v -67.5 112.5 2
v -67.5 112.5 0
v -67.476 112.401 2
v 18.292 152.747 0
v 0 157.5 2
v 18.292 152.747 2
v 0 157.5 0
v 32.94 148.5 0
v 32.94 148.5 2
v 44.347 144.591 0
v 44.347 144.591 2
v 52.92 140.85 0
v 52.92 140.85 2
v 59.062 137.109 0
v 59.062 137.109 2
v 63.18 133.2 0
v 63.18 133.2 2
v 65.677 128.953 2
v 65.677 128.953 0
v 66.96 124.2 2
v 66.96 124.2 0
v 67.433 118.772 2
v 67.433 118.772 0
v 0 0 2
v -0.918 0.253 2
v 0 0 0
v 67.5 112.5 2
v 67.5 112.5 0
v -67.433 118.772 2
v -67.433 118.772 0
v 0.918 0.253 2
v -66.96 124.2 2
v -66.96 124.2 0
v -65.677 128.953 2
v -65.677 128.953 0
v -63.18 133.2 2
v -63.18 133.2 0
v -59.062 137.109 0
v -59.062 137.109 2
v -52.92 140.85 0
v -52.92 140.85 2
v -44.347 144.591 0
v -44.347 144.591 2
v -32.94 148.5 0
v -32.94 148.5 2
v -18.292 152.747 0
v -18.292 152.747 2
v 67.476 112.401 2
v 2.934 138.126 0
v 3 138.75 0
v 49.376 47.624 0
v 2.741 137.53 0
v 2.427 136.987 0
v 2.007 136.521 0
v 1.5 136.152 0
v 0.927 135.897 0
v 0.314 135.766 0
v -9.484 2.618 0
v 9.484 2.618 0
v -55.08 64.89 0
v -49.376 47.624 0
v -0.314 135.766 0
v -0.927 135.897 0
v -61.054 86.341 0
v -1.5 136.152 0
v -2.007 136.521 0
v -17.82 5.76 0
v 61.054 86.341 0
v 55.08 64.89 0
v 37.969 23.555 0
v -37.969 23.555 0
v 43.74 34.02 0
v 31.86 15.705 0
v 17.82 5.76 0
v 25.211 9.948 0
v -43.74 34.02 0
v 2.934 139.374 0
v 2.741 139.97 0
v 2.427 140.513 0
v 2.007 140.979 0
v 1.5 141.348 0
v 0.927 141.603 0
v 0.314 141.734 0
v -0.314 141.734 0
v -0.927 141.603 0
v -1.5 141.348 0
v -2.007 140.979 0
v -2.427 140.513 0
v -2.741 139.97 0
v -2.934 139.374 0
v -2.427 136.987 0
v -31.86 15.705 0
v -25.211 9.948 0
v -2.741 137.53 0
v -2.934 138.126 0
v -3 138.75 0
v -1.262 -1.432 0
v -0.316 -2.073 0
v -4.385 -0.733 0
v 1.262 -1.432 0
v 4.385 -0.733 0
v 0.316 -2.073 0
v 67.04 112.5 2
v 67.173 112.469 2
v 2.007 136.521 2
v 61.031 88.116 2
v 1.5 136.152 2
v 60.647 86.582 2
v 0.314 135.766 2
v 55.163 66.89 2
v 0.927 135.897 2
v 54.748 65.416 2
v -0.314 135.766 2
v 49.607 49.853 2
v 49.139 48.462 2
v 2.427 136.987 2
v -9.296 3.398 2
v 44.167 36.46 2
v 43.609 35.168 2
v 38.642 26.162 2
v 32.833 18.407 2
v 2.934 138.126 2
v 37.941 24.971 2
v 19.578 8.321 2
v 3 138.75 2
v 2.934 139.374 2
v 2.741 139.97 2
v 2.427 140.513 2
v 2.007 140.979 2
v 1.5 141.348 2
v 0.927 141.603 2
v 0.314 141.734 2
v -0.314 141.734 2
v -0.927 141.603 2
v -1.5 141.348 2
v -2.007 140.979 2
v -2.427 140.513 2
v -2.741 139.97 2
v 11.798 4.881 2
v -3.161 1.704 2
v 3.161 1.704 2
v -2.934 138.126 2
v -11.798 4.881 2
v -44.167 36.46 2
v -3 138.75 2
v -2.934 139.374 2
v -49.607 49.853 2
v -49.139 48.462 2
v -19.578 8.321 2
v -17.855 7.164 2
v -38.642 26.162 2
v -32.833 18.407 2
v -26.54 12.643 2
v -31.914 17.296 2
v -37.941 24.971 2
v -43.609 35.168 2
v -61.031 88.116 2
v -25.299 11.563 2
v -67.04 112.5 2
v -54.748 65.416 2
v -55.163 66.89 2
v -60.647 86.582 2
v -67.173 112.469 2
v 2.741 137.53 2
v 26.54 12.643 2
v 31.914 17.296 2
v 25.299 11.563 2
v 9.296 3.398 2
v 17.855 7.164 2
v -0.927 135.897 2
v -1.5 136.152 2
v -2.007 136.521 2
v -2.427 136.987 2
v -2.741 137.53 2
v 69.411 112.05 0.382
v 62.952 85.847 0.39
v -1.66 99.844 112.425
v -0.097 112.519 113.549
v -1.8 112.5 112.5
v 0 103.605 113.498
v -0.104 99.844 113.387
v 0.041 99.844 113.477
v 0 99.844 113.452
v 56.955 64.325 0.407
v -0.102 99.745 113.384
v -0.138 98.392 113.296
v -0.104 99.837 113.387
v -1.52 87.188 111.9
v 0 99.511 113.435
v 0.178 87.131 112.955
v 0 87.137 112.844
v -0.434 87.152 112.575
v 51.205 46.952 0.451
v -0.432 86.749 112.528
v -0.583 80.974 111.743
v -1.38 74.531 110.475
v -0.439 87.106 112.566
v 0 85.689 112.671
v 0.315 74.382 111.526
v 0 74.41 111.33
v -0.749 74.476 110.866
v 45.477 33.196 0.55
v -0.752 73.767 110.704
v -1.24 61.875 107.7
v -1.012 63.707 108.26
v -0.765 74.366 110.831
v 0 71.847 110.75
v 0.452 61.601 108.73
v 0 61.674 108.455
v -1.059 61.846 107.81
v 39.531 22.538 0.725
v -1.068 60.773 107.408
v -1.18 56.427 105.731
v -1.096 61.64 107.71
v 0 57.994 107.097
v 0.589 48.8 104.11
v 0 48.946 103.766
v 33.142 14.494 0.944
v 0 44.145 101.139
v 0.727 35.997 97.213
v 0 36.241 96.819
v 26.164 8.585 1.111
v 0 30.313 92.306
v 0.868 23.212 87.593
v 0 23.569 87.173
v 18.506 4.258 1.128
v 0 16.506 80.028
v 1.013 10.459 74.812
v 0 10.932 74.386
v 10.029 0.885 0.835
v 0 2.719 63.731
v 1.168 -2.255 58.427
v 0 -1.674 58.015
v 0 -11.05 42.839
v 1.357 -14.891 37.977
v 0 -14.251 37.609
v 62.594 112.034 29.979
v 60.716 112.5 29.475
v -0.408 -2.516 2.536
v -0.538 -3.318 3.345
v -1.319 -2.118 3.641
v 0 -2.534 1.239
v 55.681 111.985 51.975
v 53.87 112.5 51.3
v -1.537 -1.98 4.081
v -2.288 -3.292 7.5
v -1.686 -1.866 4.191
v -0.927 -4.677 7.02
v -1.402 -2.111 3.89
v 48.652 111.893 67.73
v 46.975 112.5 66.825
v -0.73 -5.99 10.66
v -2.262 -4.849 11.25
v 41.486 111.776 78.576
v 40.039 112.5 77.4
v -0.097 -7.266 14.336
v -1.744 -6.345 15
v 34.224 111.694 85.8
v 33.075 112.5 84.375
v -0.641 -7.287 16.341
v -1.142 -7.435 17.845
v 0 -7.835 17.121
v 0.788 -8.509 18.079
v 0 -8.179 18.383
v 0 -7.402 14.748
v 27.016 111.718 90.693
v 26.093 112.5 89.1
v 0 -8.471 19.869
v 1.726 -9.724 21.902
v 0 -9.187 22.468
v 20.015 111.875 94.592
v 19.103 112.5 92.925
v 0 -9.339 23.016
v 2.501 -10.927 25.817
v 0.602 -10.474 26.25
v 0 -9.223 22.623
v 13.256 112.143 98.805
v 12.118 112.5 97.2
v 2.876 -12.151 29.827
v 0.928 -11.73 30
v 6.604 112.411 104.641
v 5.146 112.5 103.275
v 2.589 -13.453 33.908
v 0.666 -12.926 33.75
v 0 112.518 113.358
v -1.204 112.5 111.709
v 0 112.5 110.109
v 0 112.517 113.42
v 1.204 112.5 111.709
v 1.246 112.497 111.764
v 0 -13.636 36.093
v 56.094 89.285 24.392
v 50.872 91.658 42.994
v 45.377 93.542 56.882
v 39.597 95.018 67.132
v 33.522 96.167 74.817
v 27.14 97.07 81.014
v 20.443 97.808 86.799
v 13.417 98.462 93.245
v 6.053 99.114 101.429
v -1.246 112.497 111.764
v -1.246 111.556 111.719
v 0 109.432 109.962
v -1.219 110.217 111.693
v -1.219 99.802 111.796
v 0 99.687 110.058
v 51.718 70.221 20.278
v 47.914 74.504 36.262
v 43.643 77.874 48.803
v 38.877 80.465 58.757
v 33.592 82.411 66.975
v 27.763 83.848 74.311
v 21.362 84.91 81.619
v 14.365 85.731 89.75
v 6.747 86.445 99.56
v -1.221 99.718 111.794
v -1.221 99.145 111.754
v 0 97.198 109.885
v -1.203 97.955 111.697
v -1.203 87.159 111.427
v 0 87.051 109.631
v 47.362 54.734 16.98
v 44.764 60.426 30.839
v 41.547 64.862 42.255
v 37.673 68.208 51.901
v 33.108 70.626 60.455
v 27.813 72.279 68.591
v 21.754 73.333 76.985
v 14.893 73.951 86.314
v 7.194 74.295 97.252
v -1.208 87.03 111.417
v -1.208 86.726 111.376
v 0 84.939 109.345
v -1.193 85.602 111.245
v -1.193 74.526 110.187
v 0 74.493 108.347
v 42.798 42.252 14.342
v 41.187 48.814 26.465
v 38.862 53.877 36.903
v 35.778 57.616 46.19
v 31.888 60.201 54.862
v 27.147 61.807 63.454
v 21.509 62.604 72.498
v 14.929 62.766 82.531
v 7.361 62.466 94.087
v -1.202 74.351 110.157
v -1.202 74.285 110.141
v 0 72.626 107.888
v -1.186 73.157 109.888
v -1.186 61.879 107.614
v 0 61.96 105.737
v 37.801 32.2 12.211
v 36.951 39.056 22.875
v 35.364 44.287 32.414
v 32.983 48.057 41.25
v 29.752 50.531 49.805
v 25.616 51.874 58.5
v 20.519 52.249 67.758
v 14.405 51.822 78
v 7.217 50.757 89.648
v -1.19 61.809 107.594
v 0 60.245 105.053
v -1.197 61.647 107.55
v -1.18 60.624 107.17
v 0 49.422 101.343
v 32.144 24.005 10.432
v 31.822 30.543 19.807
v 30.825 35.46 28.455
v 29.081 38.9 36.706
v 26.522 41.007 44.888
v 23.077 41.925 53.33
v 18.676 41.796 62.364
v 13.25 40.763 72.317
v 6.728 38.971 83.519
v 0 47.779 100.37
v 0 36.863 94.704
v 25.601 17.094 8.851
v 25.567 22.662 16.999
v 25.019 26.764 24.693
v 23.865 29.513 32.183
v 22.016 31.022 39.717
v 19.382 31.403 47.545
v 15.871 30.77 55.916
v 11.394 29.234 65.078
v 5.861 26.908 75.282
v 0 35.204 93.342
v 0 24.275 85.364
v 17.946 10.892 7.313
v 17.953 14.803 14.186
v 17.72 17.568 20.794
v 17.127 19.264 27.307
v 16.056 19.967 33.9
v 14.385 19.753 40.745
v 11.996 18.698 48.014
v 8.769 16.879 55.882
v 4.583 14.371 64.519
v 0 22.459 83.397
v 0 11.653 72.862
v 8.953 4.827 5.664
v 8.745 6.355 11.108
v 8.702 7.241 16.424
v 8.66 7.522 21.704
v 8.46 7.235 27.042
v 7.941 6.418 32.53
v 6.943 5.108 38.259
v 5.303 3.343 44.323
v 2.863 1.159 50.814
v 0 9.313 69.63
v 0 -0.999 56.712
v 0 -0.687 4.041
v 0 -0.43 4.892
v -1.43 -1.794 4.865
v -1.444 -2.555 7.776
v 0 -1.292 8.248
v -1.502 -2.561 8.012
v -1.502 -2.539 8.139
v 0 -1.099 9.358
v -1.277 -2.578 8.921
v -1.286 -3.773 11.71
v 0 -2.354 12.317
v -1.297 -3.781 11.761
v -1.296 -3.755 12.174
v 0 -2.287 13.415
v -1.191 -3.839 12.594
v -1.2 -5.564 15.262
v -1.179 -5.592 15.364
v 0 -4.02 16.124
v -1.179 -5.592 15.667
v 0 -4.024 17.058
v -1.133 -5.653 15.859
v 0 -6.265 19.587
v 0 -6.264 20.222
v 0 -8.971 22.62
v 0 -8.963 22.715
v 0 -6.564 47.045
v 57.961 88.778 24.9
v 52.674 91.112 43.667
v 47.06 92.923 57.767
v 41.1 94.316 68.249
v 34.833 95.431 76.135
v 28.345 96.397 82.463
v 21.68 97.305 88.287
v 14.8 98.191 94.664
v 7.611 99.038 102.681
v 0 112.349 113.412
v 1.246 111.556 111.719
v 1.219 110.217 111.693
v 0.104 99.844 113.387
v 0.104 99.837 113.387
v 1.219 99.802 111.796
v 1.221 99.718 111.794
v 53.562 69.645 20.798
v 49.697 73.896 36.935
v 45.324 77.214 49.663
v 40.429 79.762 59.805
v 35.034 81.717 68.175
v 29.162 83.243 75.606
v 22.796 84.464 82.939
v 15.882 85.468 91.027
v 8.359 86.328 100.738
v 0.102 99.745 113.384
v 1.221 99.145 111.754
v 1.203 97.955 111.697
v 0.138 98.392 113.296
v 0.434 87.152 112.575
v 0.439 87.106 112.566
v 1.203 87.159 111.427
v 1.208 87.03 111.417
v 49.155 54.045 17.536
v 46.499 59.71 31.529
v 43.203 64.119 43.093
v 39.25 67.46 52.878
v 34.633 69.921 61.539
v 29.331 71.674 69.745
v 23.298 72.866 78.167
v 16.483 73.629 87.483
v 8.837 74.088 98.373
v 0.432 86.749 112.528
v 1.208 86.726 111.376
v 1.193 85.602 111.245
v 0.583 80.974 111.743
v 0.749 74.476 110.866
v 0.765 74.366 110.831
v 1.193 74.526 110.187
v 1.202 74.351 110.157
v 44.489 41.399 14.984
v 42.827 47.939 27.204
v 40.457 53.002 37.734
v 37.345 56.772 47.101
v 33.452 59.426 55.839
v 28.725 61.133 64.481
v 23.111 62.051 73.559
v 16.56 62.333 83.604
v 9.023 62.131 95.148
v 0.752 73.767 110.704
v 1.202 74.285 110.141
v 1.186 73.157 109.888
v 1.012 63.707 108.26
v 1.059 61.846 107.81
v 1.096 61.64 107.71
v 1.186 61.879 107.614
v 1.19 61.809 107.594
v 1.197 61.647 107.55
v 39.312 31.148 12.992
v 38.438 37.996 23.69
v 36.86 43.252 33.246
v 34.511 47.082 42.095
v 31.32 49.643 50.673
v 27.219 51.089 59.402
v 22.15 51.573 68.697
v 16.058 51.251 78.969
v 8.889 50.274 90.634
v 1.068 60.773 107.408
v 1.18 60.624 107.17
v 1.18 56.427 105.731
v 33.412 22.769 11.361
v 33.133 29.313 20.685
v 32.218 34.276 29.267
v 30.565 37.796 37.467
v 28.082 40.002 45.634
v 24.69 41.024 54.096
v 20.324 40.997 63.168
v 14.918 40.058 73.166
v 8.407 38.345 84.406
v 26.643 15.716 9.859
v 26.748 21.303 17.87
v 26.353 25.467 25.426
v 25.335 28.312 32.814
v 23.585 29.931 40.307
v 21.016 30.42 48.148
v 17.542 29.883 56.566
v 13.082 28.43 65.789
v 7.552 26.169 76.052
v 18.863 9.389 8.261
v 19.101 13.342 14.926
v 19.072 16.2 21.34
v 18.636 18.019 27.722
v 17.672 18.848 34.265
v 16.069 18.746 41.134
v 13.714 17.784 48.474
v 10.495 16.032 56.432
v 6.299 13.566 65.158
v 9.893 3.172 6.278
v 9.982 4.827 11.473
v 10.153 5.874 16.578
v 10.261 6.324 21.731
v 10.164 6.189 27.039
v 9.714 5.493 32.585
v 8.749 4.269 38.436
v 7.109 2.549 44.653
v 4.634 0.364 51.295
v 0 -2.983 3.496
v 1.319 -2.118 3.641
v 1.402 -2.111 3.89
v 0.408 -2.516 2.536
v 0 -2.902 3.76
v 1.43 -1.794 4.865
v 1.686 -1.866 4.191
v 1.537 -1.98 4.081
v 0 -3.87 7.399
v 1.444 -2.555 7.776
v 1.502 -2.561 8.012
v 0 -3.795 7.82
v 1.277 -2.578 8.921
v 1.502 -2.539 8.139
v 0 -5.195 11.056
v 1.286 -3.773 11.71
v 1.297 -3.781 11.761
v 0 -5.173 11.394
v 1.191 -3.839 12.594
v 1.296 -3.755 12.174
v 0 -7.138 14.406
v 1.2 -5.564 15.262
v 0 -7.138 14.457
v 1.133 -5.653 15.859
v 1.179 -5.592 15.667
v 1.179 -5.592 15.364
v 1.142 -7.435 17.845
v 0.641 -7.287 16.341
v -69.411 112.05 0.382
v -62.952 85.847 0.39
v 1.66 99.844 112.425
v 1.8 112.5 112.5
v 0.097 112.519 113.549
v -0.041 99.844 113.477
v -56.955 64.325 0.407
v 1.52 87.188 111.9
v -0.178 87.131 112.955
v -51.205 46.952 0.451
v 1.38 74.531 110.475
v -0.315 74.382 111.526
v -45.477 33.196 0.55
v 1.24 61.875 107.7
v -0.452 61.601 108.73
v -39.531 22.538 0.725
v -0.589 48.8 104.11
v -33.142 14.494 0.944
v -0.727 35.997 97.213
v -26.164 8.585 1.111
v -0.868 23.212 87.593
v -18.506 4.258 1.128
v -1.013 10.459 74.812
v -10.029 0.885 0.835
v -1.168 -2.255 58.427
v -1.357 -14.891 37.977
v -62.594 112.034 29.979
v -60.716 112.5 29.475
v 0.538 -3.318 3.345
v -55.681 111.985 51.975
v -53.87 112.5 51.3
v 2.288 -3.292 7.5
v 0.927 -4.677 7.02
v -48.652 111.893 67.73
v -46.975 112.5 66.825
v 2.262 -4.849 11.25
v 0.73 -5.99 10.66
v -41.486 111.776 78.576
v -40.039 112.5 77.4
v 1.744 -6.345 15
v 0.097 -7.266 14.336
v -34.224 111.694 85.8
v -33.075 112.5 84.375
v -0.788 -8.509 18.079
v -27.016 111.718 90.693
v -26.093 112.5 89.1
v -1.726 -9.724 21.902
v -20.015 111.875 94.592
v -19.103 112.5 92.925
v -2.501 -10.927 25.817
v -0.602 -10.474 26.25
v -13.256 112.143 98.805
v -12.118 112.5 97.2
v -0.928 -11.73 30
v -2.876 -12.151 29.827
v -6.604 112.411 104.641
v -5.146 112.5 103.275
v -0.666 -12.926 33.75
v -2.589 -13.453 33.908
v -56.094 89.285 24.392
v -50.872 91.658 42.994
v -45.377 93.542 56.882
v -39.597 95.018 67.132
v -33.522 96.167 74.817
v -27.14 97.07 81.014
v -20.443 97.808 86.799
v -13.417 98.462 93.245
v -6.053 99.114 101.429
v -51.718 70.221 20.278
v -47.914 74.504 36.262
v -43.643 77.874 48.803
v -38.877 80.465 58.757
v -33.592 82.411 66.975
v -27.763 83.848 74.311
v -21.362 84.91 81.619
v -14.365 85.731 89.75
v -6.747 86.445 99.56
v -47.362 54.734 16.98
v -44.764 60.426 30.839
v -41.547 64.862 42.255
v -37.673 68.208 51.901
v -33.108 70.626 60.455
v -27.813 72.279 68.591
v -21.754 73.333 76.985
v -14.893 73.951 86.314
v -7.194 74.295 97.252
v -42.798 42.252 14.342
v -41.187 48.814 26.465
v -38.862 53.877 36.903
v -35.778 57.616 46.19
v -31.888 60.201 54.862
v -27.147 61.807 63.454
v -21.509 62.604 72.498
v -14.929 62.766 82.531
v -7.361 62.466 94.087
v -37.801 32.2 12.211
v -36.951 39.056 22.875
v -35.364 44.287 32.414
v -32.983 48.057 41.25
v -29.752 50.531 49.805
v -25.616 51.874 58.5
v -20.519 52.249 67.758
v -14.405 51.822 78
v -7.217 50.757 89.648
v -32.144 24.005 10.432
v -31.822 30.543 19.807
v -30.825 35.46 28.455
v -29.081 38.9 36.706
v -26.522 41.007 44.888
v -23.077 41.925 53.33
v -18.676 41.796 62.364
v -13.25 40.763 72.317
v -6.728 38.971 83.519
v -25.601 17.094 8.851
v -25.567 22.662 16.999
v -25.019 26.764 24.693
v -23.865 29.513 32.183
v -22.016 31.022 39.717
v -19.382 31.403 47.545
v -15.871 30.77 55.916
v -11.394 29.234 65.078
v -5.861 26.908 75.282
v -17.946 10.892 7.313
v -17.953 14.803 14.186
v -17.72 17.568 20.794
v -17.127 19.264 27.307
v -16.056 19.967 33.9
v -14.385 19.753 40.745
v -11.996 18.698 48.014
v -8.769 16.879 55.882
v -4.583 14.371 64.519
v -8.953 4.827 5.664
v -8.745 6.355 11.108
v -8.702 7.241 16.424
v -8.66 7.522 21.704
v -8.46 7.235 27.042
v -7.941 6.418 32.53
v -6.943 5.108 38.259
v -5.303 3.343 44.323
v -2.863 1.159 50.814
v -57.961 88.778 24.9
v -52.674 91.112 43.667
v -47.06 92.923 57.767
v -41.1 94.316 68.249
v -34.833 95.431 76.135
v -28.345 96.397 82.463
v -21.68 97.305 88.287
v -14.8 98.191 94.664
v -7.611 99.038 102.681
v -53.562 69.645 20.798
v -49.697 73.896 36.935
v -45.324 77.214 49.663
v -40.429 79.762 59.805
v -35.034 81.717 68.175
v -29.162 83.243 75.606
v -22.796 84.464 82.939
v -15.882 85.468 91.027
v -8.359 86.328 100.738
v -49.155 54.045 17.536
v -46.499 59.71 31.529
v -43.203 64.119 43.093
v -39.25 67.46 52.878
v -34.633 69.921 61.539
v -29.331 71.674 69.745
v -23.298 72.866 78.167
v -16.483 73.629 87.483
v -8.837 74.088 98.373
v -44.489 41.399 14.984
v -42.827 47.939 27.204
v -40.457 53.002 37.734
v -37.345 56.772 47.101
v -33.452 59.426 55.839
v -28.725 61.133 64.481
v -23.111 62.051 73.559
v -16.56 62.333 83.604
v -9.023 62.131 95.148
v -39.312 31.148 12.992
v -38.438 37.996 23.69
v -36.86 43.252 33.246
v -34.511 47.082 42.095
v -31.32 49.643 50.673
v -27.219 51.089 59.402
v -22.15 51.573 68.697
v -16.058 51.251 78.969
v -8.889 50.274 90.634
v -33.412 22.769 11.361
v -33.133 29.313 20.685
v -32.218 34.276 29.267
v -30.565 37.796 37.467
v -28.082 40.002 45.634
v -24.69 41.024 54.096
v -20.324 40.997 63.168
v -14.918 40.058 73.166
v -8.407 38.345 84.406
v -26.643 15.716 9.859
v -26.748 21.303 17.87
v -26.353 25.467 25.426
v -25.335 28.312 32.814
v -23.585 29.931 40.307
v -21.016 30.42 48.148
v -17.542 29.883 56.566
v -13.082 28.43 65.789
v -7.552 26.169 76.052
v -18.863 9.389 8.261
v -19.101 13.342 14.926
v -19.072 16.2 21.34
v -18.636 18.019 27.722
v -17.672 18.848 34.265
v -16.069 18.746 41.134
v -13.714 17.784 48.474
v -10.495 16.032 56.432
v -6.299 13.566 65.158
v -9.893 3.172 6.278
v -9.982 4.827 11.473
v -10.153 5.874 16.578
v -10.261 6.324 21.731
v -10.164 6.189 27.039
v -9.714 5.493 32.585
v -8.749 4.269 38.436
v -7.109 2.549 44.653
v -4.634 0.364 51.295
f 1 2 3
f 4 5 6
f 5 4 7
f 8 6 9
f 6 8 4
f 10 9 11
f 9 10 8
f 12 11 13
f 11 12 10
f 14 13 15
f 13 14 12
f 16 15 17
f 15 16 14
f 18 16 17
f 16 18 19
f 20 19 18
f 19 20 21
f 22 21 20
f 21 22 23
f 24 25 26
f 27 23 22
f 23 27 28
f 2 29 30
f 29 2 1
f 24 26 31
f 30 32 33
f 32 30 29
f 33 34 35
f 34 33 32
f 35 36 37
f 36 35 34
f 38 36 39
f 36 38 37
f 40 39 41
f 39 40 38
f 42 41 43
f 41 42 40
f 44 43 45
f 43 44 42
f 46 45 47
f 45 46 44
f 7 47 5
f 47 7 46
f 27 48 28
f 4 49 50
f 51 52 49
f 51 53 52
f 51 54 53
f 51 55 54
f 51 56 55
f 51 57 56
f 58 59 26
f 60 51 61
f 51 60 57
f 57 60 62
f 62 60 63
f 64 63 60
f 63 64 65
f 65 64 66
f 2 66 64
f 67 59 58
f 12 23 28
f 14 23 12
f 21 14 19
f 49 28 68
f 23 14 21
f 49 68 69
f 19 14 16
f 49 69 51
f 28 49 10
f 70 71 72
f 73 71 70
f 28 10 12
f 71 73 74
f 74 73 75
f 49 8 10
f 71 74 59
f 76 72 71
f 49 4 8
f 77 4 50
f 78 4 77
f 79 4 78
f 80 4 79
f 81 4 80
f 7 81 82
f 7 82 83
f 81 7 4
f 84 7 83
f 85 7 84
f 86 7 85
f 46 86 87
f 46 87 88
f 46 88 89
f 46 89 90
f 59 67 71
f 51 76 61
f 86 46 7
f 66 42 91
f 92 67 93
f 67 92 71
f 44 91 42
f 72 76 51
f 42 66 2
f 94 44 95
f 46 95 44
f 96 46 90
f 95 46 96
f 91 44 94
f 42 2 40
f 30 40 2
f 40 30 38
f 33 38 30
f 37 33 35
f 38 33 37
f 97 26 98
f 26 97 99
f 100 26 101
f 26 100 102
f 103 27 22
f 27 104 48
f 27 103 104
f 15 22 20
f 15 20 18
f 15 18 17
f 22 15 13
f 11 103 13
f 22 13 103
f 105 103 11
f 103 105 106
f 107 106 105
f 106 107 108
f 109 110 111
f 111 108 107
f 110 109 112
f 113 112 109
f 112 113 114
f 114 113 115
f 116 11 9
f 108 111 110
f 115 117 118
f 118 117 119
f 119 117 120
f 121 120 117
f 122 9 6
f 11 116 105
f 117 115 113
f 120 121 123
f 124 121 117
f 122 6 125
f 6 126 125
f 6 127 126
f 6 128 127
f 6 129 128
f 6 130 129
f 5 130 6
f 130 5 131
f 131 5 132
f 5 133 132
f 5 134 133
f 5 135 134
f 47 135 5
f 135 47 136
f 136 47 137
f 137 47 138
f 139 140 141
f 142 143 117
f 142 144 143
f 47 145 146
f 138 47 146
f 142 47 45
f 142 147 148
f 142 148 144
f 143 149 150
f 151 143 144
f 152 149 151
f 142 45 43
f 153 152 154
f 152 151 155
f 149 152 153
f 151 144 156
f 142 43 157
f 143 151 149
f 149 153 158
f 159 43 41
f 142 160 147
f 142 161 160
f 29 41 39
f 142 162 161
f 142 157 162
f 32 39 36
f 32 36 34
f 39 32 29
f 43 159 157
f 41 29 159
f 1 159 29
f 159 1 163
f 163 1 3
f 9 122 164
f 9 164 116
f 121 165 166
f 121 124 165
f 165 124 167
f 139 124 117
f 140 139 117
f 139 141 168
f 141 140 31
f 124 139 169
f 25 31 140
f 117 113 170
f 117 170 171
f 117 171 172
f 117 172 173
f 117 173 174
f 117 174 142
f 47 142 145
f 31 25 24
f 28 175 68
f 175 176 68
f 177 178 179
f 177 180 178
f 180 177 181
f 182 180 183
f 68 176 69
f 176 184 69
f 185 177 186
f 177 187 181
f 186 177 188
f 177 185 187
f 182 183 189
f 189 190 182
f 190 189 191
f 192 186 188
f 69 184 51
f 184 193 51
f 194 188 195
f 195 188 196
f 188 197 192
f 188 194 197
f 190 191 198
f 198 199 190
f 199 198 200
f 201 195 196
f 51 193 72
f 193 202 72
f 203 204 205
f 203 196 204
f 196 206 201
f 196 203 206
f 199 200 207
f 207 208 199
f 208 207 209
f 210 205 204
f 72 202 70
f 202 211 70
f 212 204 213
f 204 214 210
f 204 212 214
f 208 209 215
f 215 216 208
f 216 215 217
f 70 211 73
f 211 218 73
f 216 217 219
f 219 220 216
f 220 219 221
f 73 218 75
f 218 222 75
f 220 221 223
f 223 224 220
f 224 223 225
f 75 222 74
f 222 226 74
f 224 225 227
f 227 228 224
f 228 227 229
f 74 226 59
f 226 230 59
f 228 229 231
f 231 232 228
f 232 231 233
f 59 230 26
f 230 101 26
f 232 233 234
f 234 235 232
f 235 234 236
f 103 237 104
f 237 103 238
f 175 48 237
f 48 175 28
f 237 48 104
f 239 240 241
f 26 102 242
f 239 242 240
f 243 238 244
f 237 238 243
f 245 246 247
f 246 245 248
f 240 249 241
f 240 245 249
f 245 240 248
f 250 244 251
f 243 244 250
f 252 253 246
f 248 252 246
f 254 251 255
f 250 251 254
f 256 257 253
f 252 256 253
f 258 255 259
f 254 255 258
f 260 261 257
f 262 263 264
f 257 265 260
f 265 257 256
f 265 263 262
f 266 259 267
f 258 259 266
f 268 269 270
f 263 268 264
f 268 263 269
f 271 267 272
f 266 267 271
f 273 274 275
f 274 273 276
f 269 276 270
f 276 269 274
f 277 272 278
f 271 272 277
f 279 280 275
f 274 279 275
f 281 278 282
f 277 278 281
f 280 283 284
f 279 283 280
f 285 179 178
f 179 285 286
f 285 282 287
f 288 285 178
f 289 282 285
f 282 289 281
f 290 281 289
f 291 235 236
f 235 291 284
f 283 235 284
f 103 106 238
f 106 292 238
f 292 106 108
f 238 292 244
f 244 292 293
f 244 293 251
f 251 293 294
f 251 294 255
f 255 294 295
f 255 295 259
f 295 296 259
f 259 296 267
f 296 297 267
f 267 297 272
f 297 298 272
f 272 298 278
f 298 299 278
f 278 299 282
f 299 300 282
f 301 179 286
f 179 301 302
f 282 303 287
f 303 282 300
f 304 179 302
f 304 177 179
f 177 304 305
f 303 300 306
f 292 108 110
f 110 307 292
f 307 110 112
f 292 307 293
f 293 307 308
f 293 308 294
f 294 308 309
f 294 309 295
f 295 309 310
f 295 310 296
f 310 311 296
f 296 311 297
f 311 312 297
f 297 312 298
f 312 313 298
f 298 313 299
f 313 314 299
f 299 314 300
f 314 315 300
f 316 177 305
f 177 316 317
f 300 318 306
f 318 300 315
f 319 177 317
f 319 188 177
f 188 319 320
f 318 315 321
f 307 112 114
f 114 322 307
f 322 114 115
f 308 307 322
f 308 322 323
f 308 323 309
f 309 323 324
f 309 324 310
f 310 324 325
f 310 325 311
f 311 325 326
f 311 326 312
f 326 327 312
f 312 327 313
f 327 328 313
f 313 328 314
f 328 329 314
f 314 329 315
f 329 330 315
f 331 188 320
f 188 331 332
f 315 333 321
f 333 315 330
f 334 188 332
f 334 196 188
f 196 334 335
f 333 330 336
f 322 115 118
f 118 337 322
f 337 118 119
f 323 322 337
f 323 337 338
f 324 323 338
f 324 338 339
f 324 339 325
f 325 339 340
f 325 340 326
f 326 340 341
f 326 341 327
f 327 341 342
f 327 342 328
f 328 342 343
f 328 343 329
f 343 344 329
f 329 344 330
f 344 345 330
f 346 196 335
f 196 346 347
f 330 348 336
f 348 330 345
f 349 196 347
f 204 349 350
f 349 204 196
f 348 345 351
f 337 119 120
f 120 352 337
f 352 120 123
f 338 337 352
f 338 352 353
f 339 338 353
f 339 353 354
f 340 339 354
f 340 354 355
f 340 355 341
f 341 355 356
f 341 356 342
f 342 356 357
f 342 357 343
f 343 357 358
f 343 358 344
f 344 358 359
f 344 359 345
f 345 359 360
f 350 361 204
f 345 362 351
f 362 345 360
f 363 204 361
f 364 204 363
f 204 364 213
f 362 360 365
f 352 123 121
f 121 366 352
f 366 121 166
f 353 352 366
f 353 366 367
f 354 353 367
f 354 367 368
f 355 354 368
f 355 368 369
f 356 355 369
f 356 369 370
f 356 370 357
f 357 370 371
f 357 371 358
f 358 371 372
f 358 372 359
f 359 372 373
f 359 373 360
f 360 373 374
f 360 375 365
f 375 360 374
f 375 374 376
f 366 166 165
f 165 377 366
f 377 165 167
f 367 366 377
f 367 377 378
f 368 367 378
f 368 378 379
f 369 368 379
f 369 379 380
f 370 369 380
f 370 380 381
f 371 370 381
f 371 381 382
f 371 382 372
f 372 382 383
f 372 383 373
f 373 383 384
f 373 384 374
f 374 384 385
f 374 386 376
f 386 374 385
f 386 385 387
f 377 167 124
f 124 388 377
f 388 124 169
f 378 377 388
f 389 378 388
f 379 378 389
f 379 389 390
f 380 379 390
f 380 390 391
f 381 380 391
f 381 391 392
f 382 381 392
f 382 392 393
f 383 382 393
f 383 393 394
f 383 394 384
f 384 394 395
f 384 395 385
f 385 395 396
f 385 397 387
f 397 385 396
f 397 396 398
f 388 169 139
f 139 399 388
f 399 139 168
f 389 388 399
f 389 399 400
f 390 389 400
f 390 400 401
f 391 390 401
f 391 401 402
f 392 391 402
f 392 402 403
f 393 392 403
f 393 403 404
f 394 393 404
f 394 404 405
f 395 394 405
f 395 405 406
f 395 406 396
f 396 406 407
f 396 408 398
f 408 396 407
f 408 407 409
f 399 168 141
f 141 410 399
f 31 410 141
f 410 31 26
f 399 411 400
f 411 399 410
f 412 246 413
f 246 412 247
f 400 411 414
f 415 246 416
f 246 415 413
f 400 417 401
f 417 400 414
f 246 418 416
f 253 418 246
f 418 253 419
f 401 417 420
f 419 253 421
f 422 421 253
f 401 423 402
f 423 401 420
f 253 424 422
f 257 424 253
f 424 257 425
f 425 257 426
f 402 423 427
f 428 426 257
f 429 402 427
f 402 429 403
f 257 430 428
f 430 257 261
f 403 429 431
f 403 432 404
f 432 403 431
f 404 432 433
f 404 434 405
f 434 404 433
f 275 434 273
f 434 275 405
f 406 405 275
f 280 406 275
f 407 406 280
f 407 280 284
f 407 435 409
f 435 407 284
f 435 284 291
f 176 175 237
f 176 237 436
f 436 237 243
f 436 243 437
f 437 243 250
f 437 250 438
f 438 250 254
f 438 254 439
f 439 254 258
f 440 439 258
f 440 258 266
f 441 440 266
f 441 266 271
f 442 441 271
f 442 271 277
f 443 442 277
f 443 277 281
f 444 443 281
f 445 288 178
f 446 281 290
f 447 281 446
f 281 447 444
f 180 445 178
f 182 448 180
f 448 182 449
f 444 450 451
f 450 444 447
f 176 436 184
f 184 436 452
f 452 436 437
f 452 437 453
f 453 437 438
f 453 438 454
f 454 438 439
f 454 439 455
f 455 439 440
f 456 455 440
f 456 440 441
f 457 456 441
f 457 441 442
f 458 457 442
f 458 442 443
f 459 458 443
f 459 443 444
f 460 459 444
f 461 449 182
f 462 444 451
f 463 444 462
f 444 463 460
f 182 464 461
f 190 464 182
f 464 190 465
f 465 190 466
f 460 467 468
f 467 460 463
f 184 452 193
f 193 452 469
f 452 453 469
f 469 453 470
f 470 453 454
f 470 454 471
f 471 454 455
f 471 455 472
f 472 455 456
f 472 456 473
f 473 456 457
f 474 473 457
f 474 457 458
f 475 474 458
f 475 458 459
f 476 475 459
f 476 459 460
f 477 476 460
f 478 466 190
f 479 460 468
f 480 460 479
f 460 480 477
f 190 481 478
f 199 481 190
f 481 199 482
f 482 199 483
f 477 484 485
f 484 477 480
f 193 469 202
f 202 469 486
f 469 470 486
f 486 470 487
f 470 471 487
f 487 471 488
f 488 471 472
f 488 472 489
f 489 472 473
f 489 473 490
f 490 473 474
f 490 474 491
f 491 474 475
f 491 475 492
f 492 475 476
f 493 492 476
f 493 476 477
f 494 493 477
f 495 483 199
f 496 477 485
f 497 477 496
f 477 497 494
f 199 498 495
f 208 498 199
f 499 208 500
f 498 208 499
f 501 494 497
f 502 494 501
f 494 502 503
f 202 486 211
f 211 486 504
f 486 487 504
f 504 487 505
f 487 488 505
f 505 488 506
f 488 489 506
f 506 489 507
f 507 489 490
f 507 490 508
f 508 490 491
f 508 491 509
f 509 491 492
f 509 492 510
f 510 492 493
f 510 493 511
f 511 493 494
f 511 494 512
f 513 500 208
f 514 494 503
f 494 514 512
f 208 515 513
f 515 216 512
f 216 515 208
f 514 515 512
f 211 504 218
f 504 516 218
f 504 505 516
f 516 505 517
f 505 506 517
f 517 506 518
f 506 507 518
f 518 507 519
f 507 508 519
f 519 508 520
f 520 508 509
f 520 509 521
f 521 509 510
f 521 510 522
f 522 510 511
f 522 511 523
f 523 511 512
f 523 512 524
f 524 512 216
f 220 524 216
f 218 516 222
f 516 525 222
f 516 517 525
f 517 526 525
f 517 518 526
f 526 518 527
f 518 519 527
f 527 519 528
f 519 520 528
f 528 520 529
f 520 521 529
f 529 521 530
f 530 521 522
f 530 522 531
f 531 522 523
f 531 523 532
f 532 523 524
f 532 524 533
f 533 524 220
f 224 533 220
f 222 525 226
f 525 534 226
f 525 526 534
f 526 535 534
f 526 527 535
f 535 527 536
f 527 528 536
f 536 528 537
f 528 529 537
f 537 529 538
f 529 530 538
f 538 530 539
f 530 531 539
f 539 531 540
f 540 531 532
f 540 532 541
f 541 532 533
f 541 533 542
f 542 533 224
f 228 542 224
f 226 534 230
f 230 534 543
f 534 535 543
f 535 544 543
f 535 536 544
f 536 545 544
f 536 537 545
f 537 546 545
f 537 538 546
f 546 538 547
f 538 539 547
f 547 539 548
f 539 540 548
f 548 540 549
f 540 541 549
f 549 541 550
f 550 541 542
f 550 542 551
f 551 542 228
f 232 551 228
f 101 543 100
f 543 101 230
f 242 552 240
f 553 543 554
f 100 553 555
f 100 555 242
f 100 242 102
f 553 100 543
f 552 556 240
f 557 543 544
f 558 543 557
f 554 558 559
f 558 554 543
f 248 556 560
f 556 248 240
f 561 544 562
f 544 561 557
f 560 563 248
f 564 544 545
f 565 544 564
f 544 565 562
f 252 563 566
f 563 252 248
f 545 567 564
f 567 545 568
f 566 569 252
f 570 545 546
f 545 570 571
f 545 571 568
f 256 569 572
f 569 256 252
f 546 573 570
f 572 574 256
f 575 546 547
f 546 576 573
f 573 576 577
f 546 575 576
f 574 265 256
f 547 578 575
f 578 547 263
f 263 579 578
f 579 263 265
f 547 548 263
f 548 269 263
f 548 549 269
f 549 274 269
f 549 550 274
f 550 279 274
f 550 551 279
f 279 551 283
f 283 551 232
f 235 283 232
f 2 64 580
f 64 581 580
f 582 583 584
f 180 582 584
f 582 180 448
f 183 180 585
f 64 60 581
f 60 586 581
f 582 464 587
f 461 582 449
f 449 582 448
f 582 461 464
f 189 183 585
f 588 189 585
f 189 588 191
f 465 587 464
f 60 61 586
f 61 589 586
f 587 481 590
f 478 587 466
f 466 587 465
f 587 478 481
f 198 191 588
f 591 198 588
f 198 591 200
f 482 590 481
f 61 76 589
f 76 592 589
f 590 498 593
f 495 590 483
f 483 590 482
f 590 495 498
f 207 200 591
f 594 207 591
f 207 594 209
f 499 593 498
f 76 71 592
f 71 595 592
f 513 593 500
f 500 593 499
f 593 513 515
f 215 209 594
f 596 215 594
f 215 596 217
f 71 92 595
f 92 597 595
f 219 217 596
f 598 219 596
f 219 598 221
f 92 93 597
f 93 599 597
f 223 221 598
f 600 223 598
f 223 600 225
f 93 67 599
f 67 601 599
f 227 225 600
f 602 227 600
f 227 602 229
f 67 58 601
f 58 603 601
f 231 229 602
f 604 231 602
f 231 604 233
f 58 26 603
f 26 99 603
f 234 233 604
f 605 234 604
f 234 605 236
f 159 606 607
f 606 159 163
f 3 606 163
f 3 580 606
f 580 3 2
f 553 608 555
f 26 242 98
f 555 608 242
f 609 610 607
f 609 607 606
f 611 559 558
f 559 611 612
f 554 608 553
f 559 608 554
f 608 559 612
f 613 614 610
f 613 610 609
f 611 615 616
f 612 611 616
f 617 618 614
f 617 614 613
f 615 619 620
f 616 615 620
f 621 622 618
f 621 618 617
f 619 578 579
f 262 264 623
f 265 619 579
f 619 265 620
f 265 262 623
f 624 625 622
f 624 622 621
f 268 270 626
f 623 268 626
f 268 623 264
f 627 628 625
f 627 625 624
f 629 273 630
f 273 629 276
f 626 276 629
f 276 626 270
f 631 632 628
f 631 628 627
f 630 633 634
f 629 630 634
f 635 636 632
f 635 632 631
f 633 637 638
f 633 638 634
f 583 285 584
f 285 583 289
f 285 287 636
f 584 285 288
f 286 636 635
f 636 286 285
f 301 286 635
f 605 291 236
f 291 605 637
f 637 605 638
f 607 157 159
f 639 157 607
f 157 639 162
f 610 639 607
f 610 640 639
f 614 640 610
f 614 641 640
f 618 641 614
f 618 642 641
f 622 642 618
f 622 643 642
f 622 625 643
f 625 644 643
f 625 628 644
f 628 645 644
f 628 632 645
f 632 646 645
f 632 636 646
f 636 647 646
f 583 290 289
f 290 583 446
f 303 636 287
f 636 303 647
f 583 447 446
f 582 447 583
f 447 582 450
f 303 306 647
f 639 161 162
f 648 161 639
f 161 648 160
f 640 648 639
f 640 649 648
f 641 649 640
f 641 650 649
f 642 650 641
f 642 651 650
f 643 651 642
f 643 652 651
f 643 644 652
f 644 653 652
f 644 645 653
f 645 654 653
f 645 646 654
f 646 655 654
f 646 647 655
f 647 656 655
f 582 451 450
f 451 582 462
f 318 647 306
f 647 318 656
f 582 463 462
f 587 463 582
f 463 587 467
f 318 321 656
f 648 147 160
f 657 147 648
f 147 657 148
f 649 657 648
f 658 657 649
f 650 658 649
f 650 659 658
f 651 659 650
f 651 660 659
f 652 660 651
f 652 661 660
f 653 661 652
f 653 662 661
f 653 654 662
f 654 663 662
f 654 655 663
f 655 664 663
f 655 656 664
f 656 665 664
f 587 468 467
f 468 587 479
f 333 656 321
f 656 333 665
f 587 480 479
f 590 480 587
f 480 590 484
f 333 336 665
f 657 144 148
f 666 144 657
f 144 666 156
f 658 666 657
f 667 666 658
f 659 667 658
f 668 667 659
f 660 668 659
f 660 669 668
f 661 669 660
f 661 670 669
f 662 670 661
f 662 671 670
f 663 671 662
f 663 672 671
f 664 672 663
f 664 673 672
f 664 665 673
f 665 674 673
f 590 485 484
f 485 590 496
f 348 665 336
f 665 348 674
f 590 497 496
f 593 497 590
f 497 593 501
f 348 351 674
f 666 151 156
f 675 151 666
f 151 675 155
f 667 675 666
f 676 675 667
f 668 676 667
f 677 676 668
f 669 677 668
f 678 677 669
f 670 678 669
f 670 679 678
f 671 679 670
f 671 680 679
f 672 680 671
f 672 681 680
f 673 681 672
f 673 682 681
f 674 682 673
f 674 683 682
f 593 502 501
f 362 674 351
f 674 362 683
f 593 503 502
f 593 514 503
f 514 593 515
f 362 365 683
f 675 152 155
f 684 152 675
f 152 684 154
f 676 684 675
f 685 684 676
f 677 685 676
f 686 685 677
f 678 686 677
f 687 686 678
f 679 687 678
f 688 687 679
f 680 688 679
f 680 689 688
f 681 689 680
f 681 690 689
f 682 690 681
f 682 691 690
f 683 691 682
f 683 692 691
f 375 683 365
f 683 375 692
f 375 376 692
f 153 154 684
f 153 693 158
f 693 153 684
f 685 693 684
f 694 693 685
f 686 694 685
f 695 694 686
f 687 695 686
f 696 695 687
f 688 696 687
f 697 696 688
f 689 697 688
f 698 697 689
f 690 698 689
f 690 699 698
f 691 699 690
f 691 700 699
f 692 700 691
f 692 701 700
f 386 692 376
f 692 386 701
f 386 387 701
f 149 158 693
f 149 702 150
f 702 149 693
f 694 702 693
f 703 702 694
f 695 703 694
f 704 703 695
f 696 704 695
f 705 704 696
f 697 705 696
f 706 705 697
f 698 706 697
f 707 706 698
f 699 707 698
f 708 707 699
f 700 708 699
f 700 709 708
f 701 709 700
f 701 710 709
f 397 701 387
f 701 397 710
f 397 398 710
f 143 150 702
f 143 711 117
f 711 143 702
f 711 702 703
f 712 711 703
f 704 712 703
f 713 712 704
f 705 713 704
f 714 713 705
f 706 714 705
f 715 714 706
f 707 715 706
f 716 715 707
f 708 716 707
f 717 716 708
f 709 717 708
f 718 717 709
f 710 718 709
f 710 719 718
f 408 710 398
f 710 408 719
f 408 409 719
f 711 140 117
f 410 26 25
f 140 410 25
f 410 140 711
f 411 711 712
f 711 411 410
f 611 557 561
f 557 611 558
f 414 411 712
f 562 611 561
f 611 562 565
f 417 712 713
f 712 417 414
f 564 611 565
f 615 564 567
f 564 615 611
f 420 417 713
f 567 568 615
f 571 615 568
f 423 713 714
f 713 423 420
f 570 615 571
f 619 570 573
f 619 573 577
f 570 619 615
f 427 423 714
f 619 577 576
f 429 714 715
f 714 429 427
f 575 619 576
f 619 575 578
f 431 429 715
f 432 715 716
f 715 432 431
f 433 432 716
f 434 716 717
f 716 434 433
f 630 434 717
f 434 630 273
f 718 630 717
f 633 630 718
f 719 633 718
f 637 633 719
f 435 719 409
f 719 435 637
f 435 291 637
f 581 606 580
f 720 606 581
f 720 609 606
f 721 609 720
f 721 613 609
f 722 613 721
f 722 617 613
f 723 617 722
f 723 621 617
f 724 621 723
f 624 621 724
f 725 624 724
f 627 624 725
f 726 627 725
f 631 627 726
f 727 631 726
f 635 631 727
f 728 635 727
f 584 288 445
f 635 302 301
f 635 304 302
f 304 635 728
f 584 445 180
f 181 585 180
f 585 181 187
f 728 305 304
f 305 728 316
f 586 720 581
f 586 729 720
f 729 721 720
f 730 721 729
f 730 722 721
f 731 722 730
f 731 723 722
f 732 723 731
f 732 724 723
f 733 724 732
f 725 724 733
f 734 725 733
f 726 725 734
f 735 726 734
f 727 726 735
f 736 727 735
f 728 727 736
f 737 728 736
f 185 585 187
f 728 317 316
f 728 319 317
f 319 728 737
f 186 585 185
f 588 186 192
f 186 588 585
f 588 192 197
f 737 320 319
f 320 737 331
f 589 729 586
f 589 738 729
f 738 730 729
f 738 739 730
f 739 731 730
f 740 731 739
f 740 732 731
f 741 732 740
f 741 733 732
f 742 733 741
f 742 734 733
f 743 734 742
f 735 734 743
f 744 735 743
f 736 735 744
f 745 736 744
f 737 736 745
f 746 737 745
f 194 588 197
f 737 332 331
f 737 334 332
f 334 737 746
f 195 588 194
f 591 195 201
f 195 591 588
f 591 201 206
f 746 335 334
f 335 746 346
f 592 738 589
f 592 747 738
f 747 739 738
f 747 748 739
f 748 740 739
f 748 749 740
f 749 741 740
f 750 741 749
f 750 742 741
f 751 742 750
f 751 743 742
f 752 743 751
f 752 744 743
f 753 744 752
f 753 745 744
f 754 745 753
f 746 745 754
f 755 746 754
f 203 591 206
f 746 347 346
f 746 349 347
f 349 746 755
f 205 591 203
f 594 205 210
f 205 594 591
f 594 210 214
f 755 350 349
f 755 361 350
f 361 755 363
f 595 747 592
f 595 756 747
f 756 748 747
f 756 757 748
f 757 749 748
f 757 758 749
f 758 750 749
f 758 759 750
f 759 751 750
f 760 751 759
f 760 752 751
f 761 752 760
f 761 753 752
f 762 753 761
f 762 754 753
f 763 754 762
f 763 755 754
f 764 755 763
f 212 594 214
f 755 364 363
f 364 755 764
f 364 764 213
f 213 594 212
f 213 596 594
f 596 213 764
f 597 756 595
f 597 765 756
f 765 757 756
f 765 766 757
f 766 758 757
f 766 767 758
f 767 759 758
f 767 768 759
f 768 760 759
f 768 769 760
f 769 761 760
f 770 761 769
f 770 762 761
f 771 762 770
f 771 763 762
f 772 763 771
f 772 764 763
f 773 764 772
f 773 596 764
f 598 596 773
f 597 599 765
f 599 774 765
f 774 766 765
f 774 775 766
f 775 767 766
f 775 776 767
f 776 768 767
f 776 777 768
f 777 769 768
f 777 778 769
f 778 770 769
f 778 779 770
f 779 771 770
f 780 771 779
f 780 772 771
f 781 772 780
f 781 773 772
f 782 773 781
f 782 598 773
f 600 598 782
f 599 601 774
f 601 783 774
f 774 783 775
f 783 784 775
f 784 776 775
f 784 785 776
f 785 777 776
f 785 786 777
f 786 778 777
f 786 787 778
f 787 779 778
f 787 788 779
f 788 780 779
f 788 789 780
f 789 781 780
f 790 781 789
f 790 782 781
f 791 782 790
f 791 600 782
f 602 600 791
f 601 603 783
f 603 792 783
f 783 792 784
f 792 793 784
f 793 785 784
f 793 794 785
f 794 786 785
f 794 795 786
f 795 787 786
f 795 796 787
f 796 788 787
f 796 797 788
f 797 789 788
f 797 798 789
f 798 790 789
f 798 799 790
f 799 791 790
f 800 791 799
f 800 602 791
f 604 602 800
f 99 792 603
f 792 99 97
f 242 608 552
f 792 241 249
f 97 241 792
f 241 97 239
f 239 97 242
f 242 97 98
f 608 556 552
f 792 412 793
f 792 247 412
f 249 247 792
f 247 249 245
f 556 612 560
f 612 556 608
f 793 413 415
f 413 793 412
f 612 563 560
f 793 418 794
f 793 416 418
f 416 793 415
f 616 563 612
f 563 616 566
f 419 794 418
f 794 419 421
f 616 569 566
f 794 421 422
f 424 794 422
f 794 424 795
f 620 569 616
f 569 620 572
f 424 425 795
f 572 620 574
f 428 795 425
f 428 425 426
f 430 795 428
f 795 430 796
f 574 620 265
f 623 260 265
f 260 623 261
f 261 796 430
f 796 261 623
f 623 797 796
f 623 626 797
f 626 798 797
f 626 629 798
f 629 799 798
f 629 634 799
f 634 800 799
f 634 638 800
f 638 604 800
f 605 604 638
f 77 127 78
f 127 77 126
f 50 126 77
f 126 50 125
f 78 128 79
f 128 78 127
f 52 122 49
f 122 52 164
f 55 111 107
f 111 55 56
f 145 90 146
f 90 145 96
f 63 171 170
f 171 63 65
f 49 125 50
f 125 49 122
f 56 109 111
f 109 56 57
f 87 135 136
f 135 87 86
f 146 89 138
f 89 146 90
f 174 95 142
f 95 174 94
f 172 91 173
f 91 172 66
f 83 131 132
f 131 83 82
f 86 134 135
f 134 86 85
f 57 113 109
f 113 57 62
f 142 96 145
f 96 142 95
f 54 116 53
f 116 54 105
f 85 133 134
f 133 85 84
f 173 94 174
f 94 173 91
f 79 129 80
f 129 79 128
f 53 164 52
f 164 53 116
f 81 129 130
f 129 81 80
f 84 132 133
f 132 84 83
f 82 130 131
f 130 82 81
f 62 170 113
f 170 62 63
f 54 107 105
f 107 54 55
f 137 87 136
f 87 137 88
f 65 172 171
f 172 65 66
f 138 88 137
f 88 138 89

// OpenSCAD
use <./lib/bezier.scad>;
w = 150 * .9;
wToH = 15 / 12;
wBy2 = w / 2;
a1x = wBy2 - wBy2 / 3;
a2x = wBy2 - wBy2 / 2;
b0x = wBy2;
c0x = wBy2;
wBy3 = w / 3;
h = wToH * w;
hBy2 = h / 2;
hBy3 = h / 3;
a1y = h / 10;
a2y = h / 20;
b0y = h - h / 5;
c0y = h - h / 6;

shouldery = hBy3 * 2;


s0 = [
[[-wBy2, shouldery, 0], [-a1x, a1y, 0], [-a2x, a2y, 0], [0, 0, 0]], 
[[-b0x, b0y, 0], [0, h / 2, 0], [0, h / 2, 0], [a2x, a2y, 0]],
[[-c0x, c0y, 0], [0, h / 2, 0], [0, h / 2, 0], [a1x, a1y, 0]], 
[[0, hBy3 * 2.8, 0], [c0x, c0y, 0], [b0x, b0y, 0], [wBy2, shouldery, 0]]
];

s1 = bezierSquare(s0[0][0], s0[0][3], s0[3][0], s0[3][3]);
s1p = replacePoints(s1, [
  [0, 1, s0[1][0]],
  [0, 2, s0[2][0]],
  [1, 0, s0[0][1]],
  [1, 3, s0[3][1]],
  [2, 0, s0[0][2]],
  [2, 3, s0[3][2]],
  [3, 1, s0[1][3]],
  [3, 2, s0[2][3]],
]);

wToD = 10 / 12;
depth = wToD * w;
halfOut = [-0.4, -h / 12, depth / 3];
out = [-1.8, shouldery, depth];

s2 = bezierSquare(s1p[3][3], s1p[3][0], out, halfOut);

//s2p = replacePoints(s2, [
//]);

s2p = replacePoints(s2, [
  [2, 0, s1p[3][1]],
  [1, 0, s1p[3][2]],
  [2, 1, [w / 3, h / 3, depth / 3]],
  [2, 2, [w / 4, h / 3, depth / 2]],
  [1, 1, [w / 3, h / 3, depth / 3]],
  [1, 2, [w / 4, h / 3, depth / 2]],
  [0, 1, [w / 3, shouldery, depth]],
  [1, 3, [s2[1][3][0], s2[1][3][1], depth]],
  [2, 3, [s2[2][3][0], s2[2][3][1], depth]],
  [3, 1, [s2[3][1][0] - 7, s2[3][1][1] - 1, s2[3][1][2]]],
  [3, 2, [s2[3][2][0] + 5, s2[3][2][1] - 1, s2[3][2][2]]],
]);

thickness = 2;

difference() {
union() {
bezierSurface(s1p, thickness=-thickness, controlPointSize=.2);
bezierSurface(s2p, thickness=thickness, controlPointSize=4);
mirror([1, 0, 0]) bezierSurface(s2p, thickness=thickness, controlPointSize=4);
}
#translate([0, h - 30, -5]) cylinder(10, d=6, $fn=30);
#translate([-w, -h, -1]) cube([w * 2, h * 2, 1]);
}



// planter
//translate([0, 140, 40]) rotate([90, 0, 0]) cylinder(70, d1=80, d2=70);
